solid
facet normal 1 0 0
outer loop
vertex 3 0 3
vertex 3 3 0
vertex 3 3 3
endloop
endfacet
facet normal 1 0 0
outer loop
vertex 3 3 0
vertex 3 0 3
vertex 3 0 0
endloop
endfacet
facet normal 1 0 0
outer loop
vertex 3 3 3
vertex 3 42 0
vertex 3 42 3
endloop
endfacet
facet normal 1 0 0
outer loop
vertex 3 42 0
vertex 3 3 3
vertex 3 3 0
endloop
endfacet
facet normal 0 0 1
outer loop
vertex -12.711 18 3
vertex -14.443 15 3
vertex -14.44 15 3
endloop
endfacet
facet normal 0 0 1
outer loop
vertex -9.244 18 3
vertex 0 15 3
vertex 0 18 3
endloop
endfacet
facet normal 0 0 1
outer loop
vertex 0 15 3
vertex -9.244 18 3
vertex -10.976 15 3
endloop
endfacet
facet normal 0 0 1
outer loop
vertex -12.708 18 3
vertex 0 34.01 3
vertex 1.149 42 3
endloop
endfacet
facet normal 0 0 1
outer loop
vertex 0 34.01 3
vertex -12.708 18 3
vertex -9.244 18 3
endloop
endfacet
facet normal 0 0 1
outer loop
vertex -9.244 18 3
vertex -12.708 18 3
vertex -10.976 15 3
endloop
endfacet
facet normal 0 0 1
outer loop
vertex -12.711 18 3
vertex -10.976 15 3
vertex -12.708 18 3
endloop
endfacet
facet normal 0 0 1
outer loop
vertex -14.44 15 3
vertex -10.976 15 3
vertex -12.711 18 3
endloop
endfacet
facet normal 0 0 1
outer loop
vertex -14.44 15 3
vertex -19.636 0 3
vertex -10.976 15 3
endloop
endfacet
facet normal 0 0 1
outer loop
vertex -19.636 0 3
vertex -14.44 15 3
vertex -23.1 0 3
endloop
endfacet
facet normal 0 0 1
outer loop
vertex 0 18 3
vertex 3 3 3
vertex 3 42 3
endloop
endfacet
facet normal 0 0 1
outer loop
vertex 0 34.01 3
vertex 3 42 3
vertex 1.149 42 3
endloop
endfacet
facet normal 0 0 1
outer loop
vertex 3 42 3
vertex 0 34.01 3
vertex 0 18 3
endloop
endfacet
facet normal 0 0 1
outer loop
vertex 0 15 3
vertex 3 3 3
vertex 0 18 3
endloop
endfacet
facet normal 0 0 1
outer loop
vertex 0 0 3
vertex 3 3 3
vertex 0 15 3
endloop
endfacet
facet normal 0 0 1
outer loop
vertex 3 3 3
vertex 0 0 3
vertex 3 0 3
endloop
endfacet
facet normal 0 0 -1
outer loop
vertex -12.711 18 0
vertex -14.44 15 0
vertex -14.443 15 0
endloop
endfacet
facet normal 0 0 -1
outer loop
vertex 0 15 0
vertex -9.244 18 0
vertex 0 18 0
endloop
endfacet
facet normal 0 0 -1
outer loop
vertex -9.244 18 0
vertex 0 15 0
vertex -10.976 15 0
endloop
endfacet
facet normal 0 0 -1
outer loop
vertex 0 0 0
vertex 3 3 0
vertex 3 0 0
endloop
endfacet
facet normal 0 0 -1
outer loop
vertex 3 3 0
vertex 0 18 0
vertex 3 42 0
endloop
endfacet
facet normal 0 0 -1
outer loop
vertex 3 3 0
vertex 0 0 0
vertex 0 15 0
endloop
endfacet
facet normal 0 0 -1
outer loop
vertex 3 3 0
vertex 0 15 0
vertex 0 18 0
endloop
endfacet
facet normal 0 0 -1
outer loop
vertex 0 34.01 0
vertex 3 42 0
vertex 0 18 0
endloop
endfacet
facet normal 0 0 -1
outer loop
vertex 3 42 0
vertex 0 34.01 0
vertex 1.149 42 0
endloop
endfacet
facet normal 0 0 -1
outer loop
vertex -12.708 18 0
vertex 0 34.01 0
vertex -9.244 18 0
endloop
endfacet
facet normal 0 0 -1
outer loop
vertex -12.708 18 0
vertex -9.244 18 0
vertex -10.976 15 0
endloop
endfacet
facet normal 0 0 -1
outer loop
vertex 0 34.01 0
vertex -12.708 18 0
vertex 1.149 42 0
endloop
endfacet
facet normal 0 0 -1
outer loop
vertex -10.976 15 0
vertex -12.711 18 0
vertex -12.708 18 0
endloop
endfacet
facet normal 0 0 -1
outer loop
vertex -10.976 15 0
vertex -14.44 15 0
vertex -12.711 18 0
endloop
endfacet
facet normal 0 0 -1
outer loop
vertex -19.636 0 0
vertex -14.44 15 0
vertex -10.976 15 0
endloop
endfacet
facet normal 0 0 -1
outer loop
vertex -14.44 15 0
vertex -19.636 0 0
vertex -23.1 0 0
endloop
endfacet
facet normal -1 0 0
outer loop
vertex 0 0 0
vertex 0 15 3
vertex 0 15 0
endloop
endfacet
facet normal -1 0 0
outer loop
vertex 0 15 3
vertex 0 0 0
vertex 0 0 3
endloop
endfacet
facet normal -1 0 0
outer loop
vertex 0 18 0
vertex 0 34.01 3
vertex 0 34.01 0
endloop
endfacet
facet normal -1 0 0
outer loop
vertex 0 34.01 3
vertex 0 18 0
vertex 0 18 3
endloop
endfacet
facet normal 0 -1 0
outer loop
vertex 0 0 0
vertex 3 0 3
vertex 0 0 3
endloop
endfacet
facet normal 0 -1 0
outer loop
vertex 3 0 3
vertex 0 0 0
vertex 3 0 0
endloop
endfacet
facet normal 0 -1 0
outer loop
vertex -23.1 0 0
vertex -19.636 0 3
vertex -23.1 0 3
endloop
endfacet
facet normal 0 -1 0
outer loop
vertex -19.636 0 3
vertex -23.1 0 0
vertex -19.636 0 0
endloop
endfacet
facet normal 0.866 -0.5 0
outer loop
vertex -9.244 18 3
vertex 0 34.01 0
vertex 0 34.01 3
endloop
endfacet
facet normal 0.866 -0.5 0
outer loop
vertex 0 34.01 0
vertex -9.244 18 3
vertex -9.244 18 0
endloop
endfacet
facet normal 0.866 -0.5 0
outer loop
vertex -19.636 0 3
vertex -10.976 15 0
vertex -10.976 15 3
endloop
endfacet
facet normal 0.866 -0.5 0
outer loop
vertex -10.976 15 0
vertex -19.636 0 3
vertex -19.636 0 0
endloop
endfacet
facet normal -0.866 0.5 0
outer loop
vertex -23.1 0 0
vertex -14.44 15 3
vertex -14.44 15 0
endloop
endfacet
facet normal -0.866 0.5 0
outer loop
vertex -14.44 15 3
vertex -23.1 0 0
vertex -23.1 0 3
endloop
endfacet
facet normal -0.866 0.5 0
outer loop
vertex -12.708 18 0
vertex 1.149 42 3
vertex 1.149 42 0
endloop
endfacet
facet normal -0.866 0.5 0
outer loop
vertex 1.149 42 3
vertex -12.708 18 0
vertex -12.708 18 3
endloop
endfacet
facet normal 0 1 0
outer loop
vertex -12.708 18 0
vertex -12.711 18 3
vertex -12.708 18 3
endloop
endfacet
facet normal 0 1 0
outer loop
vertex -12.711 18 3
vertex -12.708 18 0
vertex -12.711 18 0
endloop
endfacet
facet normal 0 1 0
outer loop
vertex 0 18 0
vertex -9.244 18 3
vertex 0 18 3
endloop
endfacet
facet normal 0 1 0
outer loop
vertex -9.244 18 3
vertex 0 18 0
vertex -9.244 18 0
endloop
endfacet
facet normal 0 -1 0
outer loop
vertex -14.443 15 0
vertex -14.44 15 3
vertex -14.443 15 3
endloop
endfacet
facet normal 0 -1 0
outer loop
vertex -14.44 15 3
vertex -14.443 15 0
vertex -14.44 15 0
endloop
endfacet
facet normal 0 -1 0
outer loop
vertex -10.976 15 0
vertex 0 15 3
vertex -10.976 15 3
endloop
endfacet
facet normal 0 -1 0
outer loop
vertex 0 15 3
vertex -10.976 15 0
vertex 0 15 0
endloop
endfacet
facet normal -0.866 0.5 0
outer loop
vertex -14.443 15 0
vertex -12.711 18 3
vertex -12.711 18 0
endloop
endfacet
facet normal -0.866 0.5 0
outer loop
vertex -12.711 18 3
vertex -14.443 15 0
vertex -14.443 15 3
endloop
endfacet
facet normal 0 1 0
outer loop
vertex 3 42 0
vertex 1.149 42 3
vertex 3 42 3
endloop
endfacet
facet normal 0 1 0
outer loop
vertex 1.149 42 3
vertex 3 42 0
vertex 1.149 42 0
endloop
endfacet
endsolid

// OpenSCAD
    difference(){
union(){
 cube([3,40,3]);
 translate([-23.1,0,0]) rotate([0,0,-30])  cube([3,50,3]);
 translate([-15,15,0]) cube([20,3,3]);
}
 translate([-40,-8,-1]) cube([60,8,5]);
 translate([3,3,-1]) cube([10,40,5]);
 translate([-34.65,0,-1]) rotate([0,0,-30]) cube([10,40,5]);
 translate([0,42,-1]) cube(10);
}
  
